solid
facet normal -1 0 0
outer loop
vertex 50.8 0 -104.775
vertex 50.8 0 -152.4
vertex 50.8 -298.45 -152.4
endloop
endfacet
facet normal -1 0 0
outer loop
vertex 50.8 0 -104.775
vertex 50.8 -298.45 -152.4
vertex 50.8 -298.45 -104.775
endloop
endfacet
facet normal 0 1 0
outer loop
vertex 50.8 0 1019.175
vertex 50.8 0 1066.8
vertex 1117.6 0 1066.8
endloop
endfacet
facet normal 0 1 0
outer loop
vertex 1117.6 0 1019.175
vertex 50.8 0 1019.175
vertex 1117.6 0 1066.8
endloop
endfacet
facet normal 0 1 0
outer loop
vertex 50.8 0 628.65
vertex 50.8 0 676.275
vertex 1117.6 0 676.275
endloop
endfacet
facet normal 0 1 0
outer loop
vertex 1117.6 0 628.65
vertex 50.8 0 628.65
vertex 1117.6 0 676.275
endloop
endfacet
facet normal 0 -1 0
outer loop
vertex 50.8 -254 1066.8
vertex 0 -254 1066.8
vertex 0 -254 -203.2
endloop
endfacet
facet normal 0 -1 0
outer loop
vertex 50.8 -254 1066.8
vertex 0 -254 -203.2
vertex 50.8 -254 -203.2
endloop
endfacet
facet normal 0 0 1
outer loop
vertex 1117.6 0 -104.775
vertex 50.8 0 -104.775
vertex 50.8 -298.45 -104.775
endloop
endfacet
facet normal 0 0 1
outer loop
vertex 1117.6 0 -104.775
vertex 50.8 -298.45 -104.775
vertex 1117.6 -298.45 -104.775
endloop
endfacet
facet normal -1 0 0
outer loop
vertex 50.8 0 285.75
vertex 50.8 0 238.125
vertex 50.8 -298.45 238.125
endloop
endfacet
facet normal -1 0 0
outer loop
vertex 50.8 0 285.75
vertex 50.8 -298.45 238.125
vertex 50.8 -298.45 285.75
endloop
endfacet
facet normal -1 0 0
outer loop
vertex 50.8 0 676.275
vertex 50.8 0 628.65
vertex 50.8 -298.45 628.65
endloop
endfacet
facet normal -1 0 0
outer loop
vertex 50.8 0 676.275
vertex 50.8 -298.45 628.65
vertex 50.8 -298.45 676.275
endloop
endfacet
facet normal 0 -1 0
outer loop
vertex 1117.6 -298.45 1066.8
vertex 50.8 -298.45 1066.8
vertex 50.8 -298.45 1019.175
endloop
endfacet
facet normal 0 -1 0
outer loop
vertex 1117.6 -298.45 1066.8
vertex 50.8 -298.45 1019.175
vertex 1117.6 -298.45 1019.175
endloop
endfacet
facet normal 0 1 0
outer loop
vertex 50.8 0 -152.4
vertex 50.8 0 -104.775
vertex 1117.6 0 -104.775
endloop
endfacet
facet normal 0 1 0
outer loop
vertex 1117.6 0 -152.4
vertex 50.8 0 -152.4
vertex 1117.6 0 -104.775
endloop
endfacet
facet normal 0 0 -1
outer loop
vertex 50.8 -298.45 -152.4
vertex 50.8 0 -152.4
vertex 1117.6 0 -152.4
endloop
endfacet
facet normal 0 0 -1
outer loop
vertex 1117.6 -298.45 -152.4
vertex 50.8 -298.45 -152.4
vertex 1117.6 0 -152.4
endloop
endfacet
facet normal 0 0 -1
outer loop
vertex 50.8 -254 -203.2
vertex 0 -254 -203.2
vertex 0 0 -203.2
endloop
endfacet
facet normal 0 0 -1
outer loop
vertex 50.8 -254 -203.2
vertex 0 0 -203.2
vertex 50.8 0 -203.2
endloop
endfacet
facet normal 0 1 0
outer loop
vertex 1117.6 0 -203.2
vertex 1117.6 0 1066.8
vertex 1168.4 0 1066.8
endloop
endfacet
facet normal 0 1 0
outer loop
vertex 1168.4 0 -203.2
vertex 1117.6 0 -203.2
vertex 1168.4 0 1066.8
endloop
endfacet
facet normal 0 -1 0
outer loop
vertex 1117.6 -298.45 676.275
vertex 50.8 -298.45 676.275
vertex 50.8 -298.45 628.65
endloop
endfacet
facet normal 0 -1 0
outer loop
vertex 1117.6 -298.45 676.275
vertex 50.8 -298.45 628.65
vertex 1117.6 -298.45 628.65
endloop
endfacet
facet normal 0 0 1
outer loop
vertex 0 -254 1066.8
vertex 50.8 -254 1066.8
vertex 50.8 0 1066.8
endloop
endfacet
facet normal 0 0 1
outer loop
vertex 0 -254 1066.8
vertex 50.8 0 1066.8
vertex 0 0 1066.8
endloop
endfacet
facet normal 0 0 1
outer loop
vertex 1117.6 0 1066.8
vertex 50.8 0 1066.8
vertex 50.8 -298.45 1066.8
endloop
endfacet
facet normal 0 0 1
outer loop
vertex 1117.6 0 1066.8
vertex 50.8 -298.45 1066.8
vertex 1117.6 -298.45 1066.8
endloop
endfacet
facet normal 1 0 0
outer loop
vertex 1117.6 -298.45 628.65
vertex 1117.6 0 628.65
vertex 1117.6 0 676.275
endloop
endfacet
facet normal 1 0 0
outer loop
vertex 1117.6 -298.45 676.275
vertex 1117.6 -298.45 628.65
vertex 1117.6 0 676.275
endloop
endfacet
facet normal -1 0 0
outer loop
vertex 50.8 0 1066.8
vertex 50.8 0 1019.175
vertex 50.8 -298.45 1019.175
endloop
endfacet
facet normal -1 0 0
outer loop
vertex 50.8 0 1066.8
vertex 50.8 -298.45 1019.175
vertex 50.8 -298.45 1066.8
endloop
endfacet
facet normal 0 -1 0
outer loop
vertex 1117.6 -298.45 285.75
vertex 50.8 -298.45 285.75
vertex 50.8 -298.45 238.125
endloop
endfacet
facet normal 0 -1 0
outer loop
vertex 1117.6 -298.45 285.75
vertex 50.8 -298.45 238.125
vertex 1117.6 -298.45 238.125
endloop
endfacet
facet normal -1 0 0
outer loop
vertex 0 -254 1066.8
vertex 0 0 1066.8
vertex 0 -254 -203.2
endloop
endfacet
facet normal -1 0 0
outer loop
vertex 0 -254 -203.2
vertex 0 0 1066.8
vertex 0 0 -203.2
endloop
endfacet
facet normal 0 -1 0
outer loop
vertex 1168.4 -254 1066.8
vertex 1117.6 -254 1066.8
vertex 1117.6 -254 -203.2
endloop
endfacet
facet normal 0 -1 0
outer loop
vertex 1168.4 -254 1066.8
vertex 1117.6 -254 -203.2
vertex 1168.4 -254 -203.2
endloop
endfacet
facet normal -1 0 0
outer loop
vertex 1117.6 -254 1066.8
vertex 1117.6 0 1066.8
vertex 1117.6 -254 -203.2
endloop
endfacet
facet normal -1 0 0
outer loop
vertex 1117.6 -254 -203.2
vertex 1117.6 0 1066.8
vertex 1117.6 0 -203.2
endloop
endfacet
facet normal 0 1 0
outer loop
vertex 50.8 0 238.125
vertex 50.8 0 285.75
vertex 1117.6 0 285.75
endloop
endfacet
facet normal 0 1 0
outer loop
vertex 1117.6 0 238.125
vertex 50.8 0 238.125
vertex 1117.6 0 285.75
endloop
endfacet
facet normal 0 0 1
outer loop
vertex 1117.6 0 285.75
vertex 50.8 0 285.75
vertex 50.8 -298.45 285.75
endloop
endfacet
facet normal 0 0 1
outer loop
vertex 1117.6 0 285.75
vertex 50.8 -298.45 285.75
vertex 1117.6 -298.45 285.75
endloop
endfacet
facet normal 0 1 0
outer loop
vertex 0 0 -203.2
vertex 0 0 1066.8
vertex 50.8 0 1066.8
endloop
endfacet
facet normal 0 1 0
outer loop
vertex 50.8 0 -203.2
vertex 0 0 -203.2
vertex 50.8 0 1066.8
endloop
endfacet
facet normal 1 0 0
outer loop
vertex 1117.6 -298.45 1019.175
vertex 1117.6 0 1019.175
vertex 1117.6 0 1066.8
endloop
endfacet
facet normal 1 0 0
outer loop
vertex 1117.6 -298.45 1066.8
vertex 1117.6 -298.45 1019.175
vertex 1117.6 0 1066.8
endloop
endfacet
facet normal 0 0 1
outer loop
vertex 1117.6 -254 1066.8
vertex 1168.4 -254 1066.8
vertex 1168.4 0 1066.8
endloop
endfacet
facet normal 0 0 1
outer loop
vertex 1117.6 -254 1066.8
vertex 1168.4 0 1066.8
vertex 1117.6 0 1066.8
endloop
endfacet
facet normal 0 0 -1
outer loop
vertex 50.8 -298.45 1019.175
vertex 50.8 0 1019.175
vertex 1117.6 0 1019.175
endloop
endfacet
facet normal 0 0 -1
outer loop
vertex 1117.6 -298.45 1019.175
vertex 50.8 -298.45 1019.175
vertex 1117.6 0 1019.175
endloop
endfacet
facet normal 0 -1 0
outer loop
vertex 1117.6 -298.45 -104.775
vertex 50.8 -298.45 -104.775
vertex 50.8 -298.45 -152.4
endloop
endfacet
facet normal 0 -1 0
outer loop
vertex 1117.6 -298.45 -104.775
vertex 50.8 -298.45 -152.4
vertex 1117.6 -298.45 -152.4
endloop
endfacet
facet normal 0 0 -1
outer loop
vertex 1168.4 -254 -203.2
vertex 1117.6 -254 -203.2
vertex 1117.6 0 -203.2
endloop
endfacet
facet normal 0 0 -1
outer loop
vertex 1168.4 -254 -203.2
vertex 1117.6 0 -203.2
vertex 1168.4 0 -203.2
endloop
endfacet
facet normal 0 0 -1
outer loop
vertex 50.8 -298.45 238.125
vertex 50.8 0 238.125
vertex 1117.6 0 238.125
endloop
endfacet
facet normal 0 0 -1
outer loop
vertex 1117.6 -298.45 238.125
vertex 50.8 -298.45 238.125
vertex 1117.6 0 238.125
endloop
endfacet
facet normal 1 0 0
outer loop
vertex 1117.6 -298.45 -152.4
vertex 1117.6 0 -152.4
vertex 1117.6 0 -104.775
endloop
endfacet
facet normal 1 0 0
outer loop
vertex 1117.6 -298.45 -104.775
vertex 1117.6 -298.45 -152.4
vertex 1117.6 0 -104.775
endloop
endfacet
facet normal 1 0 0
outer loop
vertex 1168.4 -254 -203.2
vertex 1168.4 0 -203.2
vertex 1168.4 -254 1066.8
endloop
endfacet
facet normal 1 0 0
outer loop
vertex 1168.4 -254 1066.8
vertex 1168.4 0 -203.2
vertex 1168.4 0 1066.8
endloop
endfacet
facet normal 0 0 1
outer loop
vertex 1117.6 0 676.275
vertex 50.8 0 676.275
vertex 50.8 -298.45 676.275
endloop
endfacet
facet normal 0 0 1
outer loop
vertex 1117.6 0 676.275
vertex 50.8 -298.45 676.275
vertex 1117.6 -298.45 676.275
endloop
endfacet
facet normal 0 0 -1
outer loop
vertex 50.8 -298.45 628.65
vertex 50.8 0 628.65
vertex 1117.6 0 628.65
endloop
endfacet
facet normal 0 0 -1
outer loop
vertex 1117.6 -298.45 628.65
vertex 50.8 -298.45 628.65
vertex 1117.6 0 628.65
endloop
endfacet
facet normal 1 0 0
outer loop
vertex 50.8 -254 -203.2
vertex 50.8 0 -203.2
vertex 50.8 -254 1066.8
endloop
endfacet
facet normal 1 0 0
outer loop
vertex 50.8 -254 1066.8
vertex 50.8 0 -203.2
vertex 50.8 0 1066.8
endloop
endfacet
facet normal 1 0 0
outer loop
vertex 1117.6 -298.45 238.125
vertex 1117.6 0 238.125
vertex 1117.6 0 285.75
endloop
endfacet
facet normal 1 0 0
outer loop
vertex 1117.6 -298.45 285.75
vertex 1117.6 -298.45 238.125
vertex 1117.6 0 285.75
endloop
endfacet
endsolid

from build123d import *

# Parameters (mm, degrees)
F1_DEPTH = 254
F0_W     = 1066.8
F0_H     = 47.625
F2_DEPTH = 298.45


with BuildPart() as f1:
    # F0 (on Front) → F1 (new body)
    with BuildSketch(Plane.XZ):
        Polygon((50.8, 1066.8), (0, 1066.8), (0, -203.2), (50.8, -203.2), (50.8, -152.4), (50.8, -104.775), (50.8, 238.125), (50.8, 285.75), (50.8, 628.65), (50.8, 676.275), (50.8, 1019.175), align=None)
        Polygon((1168.4, 1066.8), (1117.6, 1066.8), (1117.6, 1019.175), (1117.6, 676.275), (1117.6, 628.65), (1117.6, 285.75), (1117.6, 238.125), (1117.6, -104.775), (1117.6, -152.4), (1117.6, -203.2), (1168.4, -203.2), align=None)
    extrude(amount=F1_DEPTH)


with BuildPart() as f2:
    # F0 (on Front) → F2 (new body)
    with BuildSketch(Plane.XZ):
        with Locations((584.2, 1042.9875)):
            Rectangle(F0_W, F0_H)
        with Locations((584.2, 652.4625)):
            Rectangle(F0_W, F0_H)
        with Locations((584.2, 261.9375)):
            Rectangle(F0_W, F0_H)
        with Locations((584.2, -128.5875)):
            Rectangle(F0_W, F0_H)
    extrude(amount=F2_DEPTH)


solid = Compound([f1.part, f2.part])
